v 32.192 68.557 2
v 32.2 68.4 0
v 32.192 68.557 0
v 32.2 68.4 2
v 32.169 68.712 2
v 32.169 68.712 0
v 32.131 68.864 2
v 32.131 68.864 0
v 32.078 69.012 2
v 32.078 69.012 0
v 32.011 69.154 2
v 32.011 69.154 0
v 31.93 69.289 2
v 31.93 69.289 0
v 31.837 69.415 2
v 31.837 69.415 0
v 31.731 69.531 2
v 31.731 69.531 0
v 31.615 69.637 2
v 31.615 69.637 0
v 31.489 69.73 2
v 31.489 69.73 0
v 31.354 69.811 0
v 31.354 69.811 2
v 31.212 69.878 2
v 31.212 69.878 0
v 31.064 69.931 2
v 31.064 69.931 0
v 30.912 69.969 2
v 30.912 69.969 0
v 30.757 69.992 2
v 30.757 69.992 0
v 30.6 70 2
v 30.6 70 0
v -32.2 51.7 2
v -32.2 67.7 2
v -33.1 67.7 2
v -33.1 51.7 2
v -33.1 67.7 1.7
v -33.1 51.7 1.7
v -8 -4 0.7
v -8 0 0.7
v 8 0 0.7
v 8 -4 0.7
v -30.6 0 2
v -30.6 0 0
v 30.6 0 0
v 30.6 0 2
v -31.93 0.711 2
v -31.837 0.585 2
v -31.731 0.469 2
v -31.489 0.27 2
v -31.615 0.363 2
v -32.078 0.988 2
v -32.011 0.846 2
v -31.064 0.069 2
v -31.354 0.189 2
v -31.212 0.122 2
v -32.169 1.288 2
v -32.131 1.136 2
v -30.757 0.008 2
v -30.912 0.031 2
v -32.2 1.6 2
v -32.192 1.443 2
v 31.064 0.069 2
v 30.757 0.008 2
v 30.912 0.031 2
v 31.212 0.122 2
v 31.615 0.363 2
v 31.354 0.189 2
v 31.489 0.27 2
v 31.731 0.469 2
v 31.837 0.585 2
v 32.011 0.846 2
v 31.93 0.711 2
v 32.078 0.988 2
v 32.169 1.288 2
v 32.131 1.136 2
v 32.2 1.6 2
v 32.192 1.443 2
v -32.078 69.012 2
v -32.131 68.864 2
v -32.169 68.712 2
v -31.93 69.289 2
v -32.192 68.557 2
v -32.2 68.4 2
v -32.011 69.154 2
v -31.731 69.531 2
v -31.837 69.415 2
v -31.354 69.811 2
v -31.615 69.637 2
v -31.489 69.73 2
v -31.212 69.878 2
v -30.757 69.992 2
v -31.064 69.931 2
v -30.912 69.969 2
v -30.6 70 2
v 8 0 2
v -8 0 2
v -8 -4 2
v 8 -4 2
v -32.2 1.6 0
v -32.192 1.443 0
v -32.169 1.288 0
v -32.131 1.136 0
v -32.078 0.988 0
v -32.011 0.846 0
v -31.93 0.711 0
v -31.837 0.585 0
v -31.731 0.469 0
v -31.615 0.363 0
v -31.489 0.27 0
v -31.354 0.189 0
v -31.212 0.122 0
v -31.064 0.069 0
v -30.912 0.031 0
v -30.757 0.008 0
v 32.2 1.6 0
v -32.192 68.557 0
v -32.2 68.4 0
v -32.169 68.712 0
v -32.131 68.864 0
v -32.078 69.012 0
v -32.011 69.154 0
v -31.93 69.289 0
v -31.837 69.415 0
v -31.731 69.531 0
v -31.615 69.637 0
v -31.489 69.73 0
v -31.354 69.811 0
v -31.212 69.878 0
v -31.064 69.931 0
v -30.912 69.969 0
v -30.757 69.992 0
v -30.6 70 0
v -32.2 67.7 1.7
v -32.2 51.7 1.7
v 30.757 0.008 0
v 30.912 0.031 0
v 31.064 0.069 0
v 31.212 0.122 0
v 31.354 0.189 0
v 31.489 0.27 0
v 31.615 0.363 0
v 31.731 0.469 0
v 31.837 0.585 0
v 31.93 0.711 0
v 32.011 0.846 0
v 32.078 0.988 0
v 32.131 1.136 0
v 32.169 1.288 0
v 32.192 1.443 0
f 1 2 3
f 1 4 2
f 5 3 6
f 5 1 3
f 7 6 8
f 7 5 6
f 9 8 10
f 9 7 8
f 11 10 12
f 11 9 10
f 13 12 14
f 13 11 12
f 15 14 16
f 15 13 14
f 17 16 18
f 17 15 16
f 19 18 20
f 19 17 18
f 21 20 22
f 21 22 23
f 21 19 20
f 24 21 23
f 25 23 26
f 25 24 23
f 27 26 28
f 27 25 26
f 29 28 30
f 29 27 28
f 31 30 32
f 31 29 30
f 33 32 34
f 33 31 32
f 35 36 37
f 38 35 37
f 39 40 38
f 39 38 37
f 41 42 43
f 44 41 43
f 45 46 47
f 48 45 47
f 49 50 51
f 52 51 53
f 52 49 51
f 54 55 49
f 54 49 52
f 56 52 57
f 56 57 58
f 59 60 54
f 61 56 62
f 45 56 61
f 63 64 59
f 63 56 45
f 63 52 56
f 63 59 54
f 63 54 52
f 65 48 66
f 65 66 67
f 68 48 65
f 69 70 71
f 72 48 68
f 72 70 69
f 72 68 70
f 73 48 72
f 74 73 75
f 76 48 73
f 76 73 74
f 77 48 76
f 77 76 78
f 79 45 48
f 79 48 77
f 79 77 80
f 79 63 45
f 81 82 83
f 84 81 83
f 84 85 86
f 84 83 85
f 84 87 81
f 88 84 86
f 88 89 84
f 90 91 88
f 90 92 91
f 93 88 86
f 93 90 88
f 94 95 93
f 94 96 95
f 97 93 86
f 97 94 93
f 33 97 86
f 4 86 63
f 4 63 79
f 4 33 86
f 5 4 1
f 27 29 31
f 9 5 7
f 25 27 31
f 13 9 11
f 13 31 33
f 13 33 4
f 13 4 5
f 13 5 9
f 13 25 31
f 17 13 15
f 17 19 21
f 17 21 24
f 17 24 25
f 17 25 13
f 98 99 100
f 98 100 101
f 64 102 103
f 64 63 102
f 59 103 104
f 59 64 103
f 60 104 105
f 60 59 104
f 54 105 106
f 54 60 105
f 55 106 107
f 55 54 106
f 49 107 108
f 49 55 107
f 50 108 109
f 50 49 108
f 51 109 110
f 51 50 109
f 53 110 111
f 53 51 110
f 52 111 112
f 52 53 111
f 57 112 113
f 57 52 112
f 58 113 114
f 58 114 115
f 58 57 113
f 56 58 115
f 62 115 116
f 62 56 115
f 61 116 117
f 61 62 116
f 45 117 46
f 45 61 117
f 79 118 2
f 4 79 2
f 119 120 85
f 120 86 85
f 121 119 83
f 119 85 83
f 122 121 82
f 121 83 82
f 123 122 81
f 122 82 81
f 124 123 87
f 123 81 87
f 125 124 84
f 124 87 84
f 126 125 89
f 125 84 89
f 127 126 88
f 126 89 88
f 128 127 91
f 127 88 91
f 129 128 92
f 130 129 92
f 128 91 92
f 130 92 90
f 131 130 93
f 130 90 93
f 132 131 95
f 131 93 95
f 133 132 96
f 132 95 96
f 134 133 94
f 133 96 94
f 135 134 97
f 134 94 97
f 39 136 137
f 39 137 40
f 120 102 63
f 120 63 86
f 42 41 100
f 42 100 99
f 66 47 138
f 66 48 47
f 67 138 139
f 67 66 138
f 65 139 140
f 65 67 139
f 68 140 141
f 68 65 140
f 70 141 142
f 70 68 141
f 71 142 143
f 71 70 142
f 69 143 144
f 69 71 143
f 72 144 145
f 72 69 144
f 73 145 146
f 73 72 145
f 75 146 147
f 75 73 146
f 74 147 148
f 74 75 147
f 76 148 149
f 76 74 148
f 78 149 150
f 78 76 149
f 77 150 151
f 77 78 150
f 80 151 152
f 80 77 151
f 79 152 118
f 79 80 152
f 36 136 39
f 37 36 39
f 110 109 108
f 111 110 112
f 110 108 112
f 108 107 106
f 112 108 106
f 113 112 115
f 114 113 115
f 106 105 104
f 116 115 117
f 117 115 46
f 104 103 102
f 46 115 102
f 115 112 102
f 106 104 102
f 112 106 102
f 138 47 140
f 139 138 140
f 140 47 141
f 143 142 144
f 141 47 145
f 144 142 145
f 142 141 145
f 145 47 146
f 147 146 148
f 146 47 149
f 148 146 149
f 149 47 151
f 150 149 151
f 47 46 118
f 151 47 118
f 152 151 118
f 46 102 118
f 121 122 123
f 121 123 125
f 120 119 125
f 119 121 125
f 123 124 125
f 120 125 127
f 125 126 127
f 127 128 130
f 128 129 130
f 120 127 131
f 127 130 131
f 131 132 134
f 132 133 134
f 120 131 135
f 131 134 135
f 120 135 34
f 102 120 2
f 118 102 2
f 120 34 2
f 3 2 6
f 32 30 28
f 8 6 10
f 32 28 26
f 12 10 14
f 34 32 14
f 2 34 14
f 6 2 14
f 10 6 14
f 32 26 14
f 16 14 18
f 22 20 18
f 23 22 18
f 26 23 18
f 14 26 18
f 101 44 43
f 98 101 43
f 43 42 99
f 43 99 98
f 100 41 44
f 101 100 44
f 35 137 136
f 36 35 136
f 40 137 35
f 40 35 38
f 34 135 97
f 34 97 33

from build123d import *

# Parameters (mm, degrees)
BOX001_W     = 16
BOX001_H     = 4
BOX001_DEPTH = 1.3
BOX_W        = 64.4
BOX_H        = 70
BOX_DEPTH    = 2
FILLET_R     = 1.6
BOX002_W     = 0.9
BOX002_H     = 16
BOX002_DEPTH = 0.3


with BuildPart() as cube001:
    # Box001 → Box001 (new body)
    with BuildSketch(Plane(origin=(-8, -4, 0.7), x_dir=(1, 0, 0), z_dir=(0, 0, 1))):
        with Locations((8, 2)):
            Rectangle(BOX001_W, BOX001_H)
    extrude(amount=BOX001_DEPTH)


with BuildPart() as fillet_body:
    # Box → Box (new body)
    with BuildSketch(Plane(origin=(-32.2, 0, 0), x_dir=(1, 0, 0), z_dir=(0, 0, 1))):
        with Locations((32.2, 35)):
            Rectangle(BOX_W, BOX_H)
    extrude(amount=BOX_DEPTH)

    # Fillet
    fillet_edges = [fillet_body.edges().sort_by_distance(p)[0] for p in [
        (-32.2, 0, 1),
        (-32.2, 70, 1),
        (32.2, 0, 1),
        (32.2, 70, 1),
    ]]
    fillet(fillet_edges, radius=FILLET_R)


with BuildPart() as cube002:
    # Box002 → Box002 (new body)
    with BuildSketch(Plane(origin=(32.2, 51.7, 1.7), x_dir=(1, 0, 0), z_dir=(0, 0, 1))):
        with Locations((0.45, 8)):
            Rectangle(BOX002_W, BOX002_H)
    extrude(amount=BOX002_DEPTH)


with BuildPart() as part_mirroring:
    # Part__Mirroring: instance of Cube002
    add(cube002.part.mirror(Plane(origin=(0, 0, 0), x_dir=(0, -1, 0), z_dir=(1, 0, 0))))


solid = Compound([cube001.part, fillet_body.part, part_mirroring.part])
